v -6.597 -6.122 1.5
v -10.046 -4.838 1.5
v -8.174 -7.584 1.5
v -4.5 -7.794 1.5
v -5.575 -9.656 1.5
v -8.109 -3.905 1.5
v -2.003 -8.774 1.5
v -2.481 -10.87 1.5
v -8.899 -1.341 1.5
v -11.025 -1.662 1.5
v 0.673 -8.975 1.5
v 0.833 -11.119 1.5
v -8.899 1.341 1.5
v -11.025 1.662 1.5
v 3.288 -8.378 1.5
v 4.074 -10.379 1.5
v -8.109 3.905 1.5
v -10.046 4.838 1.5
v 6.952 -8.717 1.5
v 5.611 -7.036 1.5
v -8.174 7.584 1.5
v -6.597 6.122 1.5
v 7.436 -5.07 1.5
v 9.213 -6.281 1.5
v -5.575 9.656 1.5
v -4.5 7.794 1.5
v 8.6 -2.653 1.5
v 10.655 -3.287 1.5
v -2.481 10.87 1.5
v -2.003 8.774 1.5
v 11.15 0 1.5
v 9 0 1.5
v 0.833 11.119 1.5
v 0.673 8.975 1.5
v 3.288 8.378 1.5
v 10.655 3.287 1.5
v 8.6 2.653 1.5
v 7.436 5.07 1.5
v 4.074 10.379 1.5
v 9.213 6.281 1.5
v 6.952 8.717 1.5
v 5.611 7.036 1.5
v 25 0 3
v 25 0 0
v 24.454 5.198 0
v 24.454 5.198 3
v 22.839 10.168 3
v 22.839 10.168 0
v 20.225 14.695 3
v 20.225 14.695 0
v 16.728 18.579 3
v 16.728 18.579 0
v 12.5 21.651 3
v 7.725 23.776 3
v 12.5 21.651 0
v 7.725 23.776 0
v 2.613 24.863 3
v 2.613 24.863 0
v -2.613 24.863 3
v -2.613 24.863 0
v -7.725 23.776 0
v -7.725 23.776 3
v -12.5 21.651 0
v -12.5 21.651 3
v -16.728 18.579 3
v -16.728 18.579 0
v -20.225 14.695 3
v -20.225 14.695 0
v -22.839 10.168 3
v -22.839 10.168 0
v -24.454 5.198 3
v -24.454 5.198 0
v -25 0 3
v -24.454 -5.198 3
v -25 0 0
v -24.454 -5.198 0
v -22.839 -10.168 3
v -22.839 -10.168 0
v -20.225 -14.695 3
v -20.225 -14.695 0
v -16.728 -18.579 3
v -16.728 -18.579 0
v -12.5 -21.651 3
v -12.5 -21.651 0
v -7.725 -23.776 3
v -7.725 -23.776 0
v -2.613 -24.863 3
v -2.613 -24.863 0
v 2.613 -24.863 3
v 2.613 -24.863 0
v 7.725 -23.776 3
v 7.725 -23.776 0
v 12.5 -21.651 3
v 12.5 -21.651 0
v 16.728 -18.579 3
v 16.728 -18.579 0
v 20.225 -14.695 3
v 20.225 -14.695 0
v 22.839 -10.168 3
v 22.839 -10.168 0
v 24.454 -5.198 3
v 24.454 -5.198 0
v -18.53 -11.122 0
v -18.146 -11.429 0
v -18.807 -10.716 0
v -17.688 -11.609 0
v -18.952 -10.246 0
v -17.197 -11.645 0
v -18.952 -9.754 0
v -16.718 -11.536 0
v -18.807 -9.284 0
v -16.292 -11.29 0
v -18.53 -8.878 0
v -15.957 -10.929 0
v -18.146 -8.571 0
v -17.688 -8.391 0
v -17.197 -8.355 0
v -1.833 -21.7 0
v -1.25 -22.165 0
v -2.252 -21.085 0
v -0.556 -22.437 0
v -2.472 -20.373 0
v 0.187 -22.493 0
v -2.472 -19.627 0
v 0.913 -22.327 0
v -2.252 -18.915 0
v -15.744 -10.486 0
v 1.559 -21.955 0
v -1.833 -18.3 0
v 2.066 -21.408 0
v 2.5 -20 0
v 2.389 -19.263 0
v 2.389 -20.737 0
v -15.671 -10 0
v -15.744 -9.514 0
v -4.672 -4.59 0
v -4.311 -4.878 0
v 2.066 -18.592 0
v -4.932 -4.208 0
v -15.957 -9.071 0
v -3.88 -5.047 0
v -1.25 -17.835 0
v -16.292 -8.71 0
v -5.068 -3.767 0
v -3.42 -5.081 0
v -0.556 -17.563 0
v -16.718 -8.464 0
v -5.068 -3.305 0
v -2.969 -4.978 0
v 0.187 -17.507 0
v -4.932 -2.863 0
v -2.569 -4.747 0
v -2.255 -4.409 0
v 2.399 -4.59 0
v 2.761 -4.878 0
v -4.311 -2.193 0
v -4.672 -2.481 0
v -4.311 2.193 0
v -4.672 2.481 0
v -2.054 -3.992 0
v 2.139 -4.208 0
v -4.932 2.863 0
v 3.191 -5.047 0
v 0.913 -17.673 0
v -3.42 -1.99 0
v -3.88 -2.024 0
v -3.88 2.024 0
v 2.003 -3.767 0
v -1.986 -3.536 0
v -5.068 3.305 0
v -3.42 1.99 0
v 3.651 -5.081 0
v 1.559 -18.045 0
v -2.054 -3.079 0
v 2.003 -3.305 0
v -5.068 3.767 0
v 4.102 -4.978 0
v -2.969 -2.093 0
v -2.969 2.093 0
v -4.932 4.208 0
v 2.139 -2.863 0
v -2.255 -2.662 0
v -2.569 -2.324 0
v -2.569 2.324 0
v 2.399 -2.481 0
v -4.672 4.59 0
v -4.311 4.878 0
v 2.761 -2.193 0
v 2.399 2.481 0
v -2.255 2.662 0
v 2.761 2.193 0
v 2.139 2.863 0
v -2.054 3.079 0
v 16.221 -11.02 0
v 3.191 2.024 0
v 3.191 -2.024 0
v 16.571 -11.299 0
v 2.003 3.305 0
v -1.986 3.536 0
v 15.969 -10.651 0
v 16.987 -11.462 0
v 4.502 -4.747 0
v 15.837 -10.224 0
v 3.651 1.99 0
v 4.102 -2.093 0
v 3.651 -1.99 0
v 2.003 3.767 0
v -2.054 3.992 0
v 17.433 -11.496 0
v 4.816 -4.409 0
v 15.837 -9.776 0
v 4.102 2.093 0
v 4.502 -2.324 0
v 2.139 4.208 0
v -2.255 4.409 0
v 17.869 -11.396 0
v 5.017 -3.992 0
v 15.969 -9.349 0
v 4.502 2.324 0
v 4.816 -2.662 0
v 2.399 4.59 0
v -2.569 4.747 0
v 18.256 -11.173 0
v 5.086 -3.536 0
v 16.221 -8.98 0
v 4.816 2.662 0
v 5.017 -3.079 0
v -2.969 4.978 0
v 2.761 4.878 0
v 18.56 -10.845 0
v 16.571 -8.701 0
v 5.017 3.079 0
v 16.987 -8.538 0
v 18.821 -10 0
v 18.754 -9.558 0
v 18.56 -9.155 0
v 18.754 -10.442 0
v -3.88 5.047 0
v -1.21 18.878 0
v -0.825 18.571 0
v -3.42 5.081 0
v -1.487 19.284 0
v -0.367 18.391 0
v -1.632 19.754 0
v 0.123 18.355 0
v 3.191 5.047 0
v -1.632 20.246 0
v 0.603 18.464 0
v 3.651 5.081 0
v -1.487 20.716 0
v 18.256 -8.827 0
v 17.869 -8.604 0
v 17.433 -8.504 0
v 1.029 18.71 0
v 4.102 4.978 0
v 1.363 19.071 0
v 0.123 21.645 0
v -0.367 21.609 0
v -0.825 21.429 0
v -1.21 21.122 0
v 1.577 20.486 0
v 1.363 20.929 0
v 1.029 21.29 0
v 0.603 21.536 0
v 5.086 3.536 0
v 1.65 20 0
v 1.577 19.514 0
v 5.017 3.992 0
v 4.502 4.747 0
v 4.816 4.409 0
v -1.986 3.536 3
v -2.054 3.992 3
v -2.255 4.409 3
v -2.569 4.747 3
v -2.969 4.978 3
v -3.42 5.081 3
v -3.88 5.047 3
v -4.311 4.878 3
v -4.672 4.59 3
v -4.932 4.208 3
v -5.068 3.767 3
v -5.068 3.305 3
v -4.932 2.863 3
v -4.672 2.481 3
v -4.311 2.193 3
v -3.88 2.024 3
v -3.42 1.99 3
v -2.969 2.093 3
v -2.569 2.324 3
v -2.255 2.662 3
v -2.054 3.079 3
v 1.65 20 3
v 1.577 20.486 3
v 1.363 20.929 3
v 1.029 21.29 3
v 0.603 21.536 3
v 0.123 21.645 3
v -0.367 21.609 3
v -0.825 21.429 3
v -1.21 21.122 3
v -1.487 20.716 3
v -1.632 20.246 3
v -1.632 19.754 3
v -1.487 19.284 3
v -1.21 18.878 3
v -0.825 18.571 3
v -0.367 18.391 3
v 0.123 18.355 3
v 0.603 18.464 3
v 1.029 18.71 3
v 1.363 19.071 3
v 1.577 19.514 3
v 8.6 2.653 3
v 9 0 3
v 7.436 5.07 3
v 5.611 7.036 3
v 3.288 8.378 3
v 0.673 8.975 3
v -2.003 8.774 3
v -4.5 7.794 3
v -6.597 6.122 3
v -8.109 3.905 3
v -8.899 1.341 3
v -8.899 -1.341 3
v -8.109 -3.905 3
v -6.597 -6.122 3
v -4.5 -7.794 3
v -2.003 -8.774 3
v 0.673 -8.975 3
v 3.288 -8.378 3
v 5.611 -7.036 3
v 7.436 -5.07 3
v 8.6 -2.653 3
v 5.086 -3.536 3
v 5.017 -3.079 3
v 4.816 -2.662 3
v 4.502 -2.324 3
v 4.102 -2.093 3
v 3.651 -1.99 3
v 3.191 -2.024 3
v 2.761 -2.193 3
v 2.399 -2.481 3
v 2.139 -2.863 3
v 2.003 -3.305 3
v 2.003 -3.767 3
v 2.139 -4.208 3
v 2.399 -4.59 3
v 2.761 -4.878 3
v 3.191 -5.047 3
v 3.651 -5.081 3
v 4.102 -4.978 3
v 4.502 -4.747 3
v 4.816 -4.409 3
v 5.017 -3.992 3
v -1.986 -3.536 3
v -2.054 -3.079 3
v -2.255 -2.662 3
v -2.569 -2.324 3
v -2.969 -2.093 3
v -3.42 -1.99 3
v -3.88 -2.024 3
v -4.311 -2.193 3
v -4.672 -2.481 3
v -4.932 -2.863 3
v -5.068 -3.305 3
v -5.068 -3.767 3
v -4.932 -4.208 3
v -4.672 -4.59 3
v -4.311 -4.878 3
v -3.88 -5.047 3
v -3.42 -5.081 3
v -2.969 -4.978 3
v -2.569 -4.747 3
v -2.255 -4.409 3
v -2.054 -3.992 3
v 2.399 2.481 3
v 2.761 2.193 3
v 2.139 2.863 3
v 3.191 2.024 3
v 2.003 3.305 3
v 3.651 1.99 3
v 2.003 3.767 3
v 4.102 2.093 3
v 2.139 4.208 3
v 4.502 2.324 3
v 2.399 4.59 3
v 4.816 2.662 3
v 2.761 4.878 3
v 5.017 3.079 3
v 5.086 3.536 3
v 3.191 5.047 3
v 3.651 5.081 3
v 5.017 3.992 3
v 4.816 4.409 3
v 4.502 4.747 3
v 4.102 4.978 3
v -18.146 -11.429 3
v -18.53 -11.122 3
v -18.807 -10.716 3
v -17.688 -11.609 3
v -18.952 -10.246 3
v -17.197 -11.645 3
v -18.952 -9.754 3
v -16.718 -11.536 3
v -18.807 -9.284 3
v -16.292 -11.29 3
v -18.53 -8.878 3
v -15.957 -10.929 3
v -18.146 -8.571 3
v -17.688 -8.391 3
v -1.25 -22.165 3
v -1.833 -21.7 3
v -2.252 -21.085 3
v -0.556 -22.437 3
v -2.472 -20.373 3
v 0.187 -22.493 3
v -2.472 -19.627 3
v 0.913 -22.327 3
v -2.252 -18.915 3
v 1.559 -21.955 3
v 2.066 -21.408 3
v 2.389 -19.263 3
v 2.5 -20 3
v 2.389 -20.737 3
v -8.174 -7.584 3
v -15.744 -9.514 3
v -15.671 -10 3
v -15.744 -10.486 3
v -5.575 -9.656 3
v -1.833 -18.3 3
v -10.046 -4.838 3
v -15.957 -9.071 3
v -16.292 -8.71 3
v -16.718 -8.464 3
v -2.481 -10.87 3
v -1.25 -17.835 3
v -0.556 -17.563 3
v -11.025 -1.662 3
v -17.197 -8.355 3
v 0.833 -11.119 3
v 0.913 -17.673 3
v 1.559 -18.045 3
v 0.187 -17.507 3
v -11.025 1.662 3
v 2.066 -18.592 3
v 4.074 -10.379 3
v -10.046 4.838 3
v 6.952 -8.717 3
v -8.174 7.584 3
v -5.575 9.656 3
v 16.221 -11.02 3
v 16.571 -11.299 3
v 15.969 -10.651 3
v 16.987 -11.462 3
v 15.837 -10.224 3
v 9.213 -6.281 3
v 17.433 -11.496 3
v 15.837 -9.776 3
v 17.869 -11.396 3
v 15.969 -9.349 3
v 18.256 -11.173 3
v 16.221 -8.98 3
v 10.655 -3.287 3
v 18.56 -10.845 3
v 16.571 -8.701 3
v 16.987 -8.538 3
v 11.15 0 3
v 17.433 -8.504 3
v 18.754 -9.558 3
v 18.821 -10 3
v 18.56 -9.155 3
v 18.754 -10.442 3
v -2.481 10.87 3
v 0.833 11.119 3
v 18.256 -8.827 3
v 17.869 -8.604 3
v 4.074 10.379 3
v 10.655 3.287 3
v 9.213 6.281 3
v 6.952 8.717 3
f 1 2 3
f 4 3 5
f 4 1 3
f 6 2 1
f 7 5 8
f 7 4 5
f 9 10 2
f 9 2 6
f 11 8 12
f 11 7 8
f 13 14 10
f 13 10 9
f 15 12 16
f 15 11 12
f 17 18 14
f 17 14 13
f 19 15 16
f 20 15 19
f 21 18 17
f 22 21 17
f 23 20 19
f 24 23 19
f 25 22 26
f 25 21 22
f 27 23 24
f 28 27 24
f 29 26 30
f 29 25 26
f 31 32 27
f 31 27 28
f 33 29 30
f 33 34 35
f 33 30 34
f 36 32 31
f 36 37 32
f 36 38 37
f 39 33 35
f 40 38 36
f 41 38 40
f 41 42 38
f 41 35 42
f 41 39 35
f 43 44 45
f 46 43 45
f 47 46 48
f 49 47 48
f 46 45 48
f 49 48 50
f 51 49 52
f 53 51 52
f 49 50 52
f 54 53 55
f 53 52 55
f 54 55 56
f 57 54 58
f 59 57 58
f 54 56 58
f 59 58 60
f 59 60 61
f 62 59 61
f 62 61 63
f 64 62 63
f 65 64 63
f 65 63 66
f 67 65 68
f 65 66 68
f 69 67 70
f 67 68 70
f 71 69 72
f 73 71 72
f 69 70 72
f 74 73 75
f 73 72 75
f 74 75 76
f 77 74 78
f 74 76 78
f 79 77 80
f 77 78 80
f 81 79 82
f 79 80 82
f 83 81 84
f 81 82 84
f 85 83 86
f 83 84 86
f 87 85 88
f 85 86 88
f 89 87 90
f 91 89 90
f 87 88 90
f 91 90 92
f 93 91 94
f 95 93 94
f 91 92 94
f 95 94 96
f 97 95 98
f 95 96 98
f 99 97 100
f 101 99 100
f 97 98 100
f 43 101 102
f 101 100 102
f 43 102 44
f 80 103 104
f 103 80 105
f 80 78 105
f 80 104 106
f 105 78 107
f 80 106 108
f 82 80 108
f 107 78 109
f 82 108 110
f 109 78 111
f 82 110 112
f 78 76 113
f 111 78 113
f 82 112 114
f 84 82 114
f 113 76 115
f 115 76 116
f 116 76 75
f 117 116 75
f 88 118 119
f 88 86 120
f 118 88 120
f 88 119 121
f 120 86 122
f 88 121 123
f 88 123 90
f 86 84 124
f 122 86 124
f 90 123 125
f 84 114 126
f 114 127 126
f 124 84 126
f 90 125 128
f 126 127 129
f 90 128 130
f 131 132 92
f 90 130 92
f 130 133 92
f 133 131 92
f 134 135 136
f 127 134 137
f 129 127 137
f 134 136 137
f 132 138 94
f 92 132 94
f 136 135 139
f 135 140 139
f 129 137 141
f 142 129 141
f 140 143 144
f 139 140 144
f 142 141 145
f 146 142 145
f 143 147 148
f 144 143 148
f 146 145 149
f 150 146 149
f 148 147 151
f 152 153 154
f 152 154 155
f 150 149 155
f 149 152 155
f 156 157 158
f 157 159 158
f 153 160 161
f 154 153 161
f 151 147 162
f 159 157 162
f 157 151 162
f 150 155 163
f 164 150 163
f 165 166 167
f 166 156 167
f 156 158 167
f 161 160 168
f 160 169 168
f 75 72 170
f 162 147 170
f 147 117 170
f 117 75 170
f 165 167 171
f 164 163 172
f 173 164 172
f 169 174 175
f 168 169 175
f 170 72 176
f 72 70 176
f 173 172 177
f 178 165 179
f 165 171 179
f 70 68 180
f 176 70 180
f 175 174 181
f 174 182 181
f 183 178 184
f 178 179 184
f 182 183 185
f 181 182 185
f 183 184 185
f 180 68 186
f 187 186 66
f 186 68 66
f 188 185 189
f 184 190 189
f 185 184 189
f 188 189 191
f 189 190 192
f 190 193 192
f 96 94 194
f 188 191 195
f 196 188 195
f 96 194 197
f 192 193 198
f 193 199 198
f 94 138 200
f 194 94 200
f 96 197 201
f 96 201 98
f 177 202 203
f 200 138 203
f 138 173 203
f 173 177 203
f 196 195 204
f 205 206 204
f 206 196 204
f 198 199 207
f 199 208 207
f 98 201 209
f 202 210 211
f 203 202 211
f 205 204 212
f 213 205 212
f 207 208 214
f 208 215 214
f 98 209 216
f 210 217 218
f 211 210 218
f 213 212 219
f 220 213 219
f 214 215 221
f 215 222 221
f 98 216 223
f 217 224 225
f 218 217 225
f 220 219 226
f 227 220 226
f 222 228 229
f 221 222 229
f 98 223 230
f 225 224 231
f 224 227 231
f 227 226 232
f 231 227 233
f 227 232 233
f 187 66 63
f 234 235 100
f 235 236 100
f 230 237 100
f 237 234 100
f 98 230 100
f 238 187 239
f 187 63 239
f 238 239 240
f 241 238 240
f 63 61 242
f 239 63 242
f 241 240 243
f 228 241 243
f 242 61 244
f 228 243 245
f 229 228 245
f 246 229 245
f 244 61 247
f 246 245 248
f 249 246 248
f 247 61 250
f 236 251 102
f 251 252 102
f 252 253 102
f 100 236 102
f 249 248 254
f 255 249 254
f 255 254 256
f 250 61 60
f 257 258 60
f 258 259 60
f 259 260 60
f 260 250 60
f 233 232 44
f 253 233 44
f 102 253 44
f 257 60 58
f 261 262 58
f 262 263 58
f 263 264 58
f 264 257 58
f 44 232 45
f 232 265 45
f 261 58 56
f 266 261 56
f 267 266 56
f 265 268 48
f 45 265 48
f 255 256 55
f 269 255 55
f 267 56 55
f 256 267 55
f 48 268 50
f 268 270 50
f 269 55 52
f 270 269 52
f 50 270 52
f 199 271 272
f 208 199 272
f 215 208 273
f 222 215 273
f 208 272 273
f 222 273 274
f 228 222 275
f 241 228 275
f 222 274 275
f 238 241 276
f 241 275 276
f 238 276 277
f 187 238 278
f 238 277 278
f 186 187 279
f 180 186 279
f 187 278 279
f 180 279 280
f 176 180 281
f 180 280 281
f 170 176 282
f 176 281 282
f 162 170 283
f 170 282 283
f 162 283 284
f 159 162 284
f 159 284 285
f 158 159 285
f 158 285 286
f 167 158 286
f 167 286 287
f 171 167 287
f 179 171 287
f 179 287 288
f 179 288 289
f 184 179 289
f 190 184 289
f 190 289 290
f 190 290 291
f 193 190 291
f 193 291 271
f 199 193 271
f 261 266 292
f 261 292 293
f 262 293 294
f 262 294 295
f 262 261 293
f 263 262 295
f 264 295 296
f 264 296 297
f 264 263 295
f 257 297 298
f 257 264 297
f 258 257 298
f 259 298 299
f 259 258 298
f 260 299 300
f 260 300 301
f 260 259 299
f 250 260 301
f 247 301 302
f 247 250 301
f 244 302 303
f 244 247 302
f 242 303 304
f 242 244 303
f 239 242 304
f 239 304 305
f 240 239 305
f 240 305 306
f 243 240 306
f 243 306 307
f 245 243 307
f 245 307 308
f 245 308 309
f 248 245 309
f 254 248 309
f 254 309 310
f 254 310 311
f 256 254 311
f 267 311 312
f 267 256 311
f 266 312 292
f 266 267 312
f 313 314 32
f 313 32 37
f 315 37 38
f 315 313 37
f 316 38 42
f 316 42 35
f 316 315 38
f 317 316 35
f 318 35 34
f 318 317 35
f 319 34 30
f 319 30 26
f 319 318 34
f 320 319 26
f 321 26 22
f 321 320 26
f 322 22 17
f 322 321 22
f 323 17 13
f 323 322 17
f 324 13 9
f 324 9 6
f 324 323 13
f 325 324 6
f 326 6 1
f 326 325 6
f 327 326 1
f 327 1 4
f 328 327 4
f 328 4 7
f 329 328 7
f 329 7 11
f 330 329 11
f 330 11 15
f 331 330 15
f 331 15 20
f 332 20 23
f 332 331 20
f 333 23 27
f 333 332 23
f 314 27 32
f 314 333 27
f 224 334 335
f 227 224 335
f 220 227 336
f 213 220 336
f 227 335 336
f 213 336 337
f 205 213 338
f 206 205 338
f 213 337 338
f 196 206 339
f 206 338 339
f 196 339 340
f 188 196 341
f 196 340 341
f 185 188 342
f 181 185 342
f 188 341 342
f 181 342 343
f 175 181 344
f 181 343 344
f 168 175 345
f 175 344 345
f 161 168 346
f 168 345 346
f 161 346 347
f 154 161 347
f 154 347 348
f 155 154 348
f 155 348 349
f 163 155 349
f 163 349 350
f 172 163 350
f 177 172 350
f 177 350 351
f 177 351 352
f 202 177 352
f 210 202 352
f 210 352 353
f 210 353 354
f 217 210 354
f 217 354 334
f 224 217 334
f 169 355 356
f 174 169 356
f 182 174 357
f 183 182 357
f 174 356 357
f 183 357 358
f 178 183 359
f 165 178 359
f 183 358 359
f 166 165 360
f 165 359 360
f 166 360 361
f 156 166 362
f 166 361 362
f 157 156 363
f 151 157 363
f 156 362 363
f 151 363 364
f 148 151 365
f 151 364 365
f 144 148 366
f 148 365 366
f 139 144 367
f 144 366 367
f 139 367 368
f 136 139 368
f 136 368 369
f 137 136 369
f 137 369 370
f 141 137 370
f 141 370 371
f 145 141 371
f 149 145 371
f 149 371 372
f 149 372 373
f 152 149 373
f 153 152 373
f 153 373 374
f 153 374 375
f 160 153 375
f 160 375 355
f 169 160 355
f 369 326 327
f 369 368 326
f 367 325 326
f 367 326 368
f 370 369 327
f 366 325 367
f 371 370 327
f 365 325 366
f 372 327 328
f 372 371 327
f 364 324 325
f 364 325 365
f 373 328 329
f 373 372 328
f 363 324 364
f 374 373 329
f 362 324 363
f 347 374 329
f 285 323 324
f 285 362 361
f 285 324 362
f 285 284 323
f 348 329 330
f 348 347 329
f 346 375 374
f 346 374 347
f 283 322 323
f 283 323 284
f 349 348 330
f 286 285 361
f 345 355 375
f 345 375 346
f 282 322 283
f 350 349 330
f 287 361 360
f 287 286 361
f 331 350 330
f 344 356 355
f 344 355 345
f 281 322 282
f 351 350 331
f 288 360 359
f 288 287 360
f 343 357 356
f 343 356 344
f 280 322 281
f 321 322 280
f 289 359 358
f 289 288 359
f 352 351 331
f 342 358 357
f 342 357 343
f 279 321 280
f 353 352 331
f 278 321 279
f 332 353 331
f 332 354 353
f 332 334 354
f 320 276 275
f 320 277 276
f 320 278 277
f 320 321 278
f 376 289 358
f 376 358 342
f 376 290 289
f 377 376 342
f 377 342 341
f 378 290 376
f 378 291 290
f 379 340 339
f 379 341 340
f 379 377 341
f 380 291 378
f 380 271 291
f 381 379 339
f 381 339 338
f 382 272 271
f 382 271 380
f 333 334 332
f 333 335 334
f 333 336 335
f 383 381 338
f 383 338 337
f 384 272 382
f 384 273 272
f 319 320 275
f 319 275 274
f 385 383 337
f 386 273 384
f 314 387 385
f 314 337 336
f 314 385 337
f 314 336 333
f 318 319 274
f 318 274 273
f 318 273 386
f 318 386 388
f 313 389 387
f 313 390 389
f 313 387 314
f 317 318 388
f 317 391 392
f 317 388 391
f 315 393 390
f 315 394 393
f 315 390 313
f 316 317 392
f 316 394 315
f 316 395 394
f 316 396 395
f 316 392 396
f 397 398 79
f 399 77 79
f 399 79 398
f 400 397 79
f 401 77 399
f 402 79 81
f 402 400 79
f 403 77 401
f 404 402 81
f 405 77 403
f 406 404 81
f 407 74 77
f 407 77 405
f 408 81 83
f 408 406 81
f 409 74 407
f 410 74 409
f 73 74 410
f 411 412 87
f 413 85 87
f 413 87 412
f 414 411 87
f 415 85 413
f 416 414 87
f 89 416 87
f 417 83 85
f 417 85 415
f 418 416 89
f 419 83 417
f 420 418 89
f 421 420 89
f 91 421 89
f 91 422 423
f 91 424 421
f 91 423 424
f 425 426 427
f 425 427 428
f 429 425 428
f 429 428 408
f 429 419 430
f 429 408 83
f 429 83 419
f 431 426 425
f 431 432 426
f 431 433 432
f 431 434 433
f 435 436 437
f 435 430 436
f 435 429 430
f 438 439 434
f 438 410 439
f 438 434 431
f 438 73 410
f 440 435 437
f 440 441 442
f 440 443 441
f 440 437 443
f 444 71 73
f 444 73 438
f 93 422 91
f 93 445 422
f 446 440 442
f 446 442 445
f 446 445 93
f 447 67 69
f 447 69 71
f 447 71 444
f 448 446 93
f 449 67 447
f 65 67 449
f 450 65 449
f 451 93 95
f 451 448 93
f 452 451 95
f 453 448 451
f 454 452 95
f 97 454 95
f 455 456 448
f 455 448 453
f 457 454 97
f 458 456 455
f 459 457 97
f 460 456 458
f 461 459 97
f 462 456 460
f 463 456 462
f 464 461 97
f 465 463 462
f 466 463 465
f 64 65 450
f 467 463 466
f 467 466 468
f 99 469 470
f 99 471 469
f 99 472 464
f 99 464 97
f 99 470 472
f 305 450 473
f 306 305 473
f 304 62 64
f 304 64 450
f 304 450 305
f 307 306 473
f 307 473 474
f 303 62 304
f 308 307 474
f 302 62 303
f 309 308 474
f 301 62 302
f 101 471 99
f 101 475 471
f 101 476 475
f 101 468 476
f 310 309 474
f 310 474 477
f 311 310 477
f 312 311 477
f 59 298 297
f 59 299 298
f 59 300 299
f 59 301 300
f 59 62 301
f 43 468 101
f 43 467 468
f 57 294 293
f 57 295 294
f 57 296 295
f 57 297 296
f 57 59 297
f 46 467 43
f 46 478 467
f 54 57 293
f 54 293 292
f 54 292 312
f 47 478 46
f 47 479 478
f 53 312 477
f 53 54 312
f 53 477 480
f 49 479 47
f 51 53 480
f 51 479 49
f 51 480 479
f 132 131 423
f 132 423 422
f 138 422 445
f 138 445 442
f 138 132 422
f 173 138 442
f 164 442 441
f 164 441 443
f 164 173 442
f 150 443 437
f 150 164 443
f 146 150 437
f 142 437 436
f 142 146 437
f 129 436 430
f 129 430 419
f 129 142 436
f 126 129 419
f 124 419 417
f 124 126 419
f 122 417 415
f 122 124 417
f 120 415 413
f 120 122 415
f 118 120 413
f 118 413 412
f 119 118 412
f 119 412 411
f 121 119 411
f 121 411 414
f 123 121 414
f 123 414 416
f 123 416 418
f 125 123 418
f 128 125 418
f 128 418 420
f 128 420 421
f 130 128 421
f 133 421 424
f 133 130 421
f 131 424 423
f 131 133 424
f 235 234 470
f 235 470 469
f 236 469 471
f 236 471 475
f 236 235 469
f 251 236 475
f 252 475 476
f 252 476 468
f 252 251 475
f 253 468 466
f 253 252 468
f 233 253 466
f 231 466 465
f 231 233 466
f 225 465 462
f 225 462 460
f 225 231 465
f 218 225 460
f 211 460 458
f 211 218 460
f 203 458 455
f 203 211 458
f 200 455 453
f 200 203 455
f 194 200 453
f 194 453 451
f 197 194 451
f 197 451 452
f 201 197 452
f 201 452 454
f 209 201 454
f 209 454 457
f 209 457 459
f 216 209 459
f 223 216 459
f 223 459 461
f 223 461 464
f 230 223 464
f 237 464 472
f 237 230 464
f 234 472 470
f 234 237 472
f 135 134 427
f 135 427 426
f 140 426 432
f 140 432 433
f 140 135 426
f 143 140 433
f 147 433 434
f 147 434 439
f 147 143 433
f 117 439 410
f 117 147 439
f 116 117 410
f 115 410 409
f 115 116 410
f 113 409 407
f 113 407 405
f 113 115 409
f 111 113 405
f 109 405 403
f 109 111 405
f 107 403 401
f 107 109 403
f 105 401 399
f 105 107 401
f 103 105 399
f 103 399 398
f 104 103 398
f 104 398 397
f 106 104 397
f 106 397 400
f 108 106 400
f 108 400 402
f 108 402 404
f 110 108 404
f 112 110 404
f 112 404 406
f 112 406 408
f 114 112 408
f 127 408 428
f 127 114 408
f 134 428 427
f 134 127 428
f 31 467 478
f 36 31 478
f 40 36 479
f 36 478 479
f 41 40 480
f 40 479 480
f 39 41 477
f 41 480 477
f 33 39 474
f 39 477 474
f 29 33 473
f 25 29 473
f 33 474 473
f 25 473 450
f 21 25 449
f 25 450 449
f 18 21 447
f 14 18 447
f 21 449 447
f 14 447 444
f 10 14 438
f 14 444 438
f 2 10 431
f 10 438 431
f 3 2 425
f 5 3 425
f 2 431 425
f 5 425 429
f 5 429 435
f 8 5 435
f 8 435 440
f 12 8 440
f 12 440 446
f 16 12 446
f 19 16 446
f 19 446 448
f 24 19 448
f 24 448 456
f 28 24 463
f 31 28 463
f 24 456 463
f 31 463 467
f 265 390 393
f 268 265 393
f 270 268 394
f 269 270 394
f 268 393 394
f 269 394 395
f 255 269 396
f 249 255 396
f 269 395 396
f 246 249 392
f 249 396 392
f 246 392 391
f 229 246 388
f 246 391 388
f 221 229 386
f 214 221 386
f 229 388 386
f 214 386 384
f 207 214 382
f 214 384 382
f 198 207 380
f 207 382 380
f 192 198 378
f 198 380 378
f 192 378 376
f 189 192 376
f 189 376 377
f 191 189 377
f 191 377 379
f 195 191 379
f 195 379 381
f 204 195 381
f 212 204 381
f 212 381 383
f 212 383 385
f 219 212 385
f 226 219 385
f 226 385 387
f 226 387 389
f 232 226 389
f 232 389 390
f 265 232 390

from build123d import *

# Parameters (mm, degrees)
SKETCH_1_R          = 25
SKETCH_1_R_2        = 2.5
SKETCH_1_R_3        = 1.65
SKETCH_1_R_4        = 1.5
SKETCH_1_R_5        = 11.05
EXTRUDE_1_DEPTH     = 3
SKETCH_2_R          = 11.15
SKETCH_2_R_2        = 9
CUT_EXTRUDE_1_DEPTH = 1.5
SKETCH_4_R          = 1.55
CUT_EXTRUDE_2_DEPTH = 36.482389998


with BuildPart() as part:
    # 草图1 → 凸台-拉伸1 (new body)
    # profile 1 of 2: a face of its own
    with BuildSketch(Plane.XY):
        Circle(SKETCH_1_R)
        with Locations((0, -20)):
            Circle(SKETCH_1_R_2, mode=Mode.SUBTRACT)
        with Locations((0, 20)):
            Circle(SKETCH_1_R_3, mode=Mode.SUBTRACT)
        with Locations((-17.320508076, -10)):
            Circle(SKETCH_1_R_3, mode=Mode.SUBTRACT)
        with Locations((17.320508076, -10)):
            Circle(SKETCH_1_R_4, mode=Mode.SUBTRACT)
        Circle(SKETCH_1_R_5, mode=Mode.SUBTRACT)
    # profile 2 of 2: a face of its own
    with BuildSketch(Plane.XY):
        Circle(SKETCH_1_R_5)
    extrude(amount=EXTRUDE_1_DEPTH)

    # 草图2 → 切除-拉伸1 (cut)
    with BuildSketch(Plane.XY.offset(3)):
        Circle(SKETCH_2_R)
        Circle(SKETCH_2_R_2, mode=Mode.SUBTRACT)
    extrude(amount=-CUT_EXTRUDE_1_DEPTH, mode=Mode.SUBTRACT)

    # 草图4 → 切除-拉伸2 (cut, through all)
    with BuildSketch(Plane.XY.offset(3)):
        with Locations((-3.535533906, 3.535533906)):
            Circle(SKETCH_4_R)
        with Locations((3.535533906, 3.535533906)):
            Circle(SKETCH_4_R)
        with Locations((3.535533906, -3.535533906)):
            Circle(SKETCH_4_R)
        with Locations((-3.535533906, -3.535533906)):
            Circle(SKETCH_4_R)
    extrude(amount=-CUT_EXTRUDE_2_DEPTH, mode=Mode.SUBTRACT)


solid = part.part
